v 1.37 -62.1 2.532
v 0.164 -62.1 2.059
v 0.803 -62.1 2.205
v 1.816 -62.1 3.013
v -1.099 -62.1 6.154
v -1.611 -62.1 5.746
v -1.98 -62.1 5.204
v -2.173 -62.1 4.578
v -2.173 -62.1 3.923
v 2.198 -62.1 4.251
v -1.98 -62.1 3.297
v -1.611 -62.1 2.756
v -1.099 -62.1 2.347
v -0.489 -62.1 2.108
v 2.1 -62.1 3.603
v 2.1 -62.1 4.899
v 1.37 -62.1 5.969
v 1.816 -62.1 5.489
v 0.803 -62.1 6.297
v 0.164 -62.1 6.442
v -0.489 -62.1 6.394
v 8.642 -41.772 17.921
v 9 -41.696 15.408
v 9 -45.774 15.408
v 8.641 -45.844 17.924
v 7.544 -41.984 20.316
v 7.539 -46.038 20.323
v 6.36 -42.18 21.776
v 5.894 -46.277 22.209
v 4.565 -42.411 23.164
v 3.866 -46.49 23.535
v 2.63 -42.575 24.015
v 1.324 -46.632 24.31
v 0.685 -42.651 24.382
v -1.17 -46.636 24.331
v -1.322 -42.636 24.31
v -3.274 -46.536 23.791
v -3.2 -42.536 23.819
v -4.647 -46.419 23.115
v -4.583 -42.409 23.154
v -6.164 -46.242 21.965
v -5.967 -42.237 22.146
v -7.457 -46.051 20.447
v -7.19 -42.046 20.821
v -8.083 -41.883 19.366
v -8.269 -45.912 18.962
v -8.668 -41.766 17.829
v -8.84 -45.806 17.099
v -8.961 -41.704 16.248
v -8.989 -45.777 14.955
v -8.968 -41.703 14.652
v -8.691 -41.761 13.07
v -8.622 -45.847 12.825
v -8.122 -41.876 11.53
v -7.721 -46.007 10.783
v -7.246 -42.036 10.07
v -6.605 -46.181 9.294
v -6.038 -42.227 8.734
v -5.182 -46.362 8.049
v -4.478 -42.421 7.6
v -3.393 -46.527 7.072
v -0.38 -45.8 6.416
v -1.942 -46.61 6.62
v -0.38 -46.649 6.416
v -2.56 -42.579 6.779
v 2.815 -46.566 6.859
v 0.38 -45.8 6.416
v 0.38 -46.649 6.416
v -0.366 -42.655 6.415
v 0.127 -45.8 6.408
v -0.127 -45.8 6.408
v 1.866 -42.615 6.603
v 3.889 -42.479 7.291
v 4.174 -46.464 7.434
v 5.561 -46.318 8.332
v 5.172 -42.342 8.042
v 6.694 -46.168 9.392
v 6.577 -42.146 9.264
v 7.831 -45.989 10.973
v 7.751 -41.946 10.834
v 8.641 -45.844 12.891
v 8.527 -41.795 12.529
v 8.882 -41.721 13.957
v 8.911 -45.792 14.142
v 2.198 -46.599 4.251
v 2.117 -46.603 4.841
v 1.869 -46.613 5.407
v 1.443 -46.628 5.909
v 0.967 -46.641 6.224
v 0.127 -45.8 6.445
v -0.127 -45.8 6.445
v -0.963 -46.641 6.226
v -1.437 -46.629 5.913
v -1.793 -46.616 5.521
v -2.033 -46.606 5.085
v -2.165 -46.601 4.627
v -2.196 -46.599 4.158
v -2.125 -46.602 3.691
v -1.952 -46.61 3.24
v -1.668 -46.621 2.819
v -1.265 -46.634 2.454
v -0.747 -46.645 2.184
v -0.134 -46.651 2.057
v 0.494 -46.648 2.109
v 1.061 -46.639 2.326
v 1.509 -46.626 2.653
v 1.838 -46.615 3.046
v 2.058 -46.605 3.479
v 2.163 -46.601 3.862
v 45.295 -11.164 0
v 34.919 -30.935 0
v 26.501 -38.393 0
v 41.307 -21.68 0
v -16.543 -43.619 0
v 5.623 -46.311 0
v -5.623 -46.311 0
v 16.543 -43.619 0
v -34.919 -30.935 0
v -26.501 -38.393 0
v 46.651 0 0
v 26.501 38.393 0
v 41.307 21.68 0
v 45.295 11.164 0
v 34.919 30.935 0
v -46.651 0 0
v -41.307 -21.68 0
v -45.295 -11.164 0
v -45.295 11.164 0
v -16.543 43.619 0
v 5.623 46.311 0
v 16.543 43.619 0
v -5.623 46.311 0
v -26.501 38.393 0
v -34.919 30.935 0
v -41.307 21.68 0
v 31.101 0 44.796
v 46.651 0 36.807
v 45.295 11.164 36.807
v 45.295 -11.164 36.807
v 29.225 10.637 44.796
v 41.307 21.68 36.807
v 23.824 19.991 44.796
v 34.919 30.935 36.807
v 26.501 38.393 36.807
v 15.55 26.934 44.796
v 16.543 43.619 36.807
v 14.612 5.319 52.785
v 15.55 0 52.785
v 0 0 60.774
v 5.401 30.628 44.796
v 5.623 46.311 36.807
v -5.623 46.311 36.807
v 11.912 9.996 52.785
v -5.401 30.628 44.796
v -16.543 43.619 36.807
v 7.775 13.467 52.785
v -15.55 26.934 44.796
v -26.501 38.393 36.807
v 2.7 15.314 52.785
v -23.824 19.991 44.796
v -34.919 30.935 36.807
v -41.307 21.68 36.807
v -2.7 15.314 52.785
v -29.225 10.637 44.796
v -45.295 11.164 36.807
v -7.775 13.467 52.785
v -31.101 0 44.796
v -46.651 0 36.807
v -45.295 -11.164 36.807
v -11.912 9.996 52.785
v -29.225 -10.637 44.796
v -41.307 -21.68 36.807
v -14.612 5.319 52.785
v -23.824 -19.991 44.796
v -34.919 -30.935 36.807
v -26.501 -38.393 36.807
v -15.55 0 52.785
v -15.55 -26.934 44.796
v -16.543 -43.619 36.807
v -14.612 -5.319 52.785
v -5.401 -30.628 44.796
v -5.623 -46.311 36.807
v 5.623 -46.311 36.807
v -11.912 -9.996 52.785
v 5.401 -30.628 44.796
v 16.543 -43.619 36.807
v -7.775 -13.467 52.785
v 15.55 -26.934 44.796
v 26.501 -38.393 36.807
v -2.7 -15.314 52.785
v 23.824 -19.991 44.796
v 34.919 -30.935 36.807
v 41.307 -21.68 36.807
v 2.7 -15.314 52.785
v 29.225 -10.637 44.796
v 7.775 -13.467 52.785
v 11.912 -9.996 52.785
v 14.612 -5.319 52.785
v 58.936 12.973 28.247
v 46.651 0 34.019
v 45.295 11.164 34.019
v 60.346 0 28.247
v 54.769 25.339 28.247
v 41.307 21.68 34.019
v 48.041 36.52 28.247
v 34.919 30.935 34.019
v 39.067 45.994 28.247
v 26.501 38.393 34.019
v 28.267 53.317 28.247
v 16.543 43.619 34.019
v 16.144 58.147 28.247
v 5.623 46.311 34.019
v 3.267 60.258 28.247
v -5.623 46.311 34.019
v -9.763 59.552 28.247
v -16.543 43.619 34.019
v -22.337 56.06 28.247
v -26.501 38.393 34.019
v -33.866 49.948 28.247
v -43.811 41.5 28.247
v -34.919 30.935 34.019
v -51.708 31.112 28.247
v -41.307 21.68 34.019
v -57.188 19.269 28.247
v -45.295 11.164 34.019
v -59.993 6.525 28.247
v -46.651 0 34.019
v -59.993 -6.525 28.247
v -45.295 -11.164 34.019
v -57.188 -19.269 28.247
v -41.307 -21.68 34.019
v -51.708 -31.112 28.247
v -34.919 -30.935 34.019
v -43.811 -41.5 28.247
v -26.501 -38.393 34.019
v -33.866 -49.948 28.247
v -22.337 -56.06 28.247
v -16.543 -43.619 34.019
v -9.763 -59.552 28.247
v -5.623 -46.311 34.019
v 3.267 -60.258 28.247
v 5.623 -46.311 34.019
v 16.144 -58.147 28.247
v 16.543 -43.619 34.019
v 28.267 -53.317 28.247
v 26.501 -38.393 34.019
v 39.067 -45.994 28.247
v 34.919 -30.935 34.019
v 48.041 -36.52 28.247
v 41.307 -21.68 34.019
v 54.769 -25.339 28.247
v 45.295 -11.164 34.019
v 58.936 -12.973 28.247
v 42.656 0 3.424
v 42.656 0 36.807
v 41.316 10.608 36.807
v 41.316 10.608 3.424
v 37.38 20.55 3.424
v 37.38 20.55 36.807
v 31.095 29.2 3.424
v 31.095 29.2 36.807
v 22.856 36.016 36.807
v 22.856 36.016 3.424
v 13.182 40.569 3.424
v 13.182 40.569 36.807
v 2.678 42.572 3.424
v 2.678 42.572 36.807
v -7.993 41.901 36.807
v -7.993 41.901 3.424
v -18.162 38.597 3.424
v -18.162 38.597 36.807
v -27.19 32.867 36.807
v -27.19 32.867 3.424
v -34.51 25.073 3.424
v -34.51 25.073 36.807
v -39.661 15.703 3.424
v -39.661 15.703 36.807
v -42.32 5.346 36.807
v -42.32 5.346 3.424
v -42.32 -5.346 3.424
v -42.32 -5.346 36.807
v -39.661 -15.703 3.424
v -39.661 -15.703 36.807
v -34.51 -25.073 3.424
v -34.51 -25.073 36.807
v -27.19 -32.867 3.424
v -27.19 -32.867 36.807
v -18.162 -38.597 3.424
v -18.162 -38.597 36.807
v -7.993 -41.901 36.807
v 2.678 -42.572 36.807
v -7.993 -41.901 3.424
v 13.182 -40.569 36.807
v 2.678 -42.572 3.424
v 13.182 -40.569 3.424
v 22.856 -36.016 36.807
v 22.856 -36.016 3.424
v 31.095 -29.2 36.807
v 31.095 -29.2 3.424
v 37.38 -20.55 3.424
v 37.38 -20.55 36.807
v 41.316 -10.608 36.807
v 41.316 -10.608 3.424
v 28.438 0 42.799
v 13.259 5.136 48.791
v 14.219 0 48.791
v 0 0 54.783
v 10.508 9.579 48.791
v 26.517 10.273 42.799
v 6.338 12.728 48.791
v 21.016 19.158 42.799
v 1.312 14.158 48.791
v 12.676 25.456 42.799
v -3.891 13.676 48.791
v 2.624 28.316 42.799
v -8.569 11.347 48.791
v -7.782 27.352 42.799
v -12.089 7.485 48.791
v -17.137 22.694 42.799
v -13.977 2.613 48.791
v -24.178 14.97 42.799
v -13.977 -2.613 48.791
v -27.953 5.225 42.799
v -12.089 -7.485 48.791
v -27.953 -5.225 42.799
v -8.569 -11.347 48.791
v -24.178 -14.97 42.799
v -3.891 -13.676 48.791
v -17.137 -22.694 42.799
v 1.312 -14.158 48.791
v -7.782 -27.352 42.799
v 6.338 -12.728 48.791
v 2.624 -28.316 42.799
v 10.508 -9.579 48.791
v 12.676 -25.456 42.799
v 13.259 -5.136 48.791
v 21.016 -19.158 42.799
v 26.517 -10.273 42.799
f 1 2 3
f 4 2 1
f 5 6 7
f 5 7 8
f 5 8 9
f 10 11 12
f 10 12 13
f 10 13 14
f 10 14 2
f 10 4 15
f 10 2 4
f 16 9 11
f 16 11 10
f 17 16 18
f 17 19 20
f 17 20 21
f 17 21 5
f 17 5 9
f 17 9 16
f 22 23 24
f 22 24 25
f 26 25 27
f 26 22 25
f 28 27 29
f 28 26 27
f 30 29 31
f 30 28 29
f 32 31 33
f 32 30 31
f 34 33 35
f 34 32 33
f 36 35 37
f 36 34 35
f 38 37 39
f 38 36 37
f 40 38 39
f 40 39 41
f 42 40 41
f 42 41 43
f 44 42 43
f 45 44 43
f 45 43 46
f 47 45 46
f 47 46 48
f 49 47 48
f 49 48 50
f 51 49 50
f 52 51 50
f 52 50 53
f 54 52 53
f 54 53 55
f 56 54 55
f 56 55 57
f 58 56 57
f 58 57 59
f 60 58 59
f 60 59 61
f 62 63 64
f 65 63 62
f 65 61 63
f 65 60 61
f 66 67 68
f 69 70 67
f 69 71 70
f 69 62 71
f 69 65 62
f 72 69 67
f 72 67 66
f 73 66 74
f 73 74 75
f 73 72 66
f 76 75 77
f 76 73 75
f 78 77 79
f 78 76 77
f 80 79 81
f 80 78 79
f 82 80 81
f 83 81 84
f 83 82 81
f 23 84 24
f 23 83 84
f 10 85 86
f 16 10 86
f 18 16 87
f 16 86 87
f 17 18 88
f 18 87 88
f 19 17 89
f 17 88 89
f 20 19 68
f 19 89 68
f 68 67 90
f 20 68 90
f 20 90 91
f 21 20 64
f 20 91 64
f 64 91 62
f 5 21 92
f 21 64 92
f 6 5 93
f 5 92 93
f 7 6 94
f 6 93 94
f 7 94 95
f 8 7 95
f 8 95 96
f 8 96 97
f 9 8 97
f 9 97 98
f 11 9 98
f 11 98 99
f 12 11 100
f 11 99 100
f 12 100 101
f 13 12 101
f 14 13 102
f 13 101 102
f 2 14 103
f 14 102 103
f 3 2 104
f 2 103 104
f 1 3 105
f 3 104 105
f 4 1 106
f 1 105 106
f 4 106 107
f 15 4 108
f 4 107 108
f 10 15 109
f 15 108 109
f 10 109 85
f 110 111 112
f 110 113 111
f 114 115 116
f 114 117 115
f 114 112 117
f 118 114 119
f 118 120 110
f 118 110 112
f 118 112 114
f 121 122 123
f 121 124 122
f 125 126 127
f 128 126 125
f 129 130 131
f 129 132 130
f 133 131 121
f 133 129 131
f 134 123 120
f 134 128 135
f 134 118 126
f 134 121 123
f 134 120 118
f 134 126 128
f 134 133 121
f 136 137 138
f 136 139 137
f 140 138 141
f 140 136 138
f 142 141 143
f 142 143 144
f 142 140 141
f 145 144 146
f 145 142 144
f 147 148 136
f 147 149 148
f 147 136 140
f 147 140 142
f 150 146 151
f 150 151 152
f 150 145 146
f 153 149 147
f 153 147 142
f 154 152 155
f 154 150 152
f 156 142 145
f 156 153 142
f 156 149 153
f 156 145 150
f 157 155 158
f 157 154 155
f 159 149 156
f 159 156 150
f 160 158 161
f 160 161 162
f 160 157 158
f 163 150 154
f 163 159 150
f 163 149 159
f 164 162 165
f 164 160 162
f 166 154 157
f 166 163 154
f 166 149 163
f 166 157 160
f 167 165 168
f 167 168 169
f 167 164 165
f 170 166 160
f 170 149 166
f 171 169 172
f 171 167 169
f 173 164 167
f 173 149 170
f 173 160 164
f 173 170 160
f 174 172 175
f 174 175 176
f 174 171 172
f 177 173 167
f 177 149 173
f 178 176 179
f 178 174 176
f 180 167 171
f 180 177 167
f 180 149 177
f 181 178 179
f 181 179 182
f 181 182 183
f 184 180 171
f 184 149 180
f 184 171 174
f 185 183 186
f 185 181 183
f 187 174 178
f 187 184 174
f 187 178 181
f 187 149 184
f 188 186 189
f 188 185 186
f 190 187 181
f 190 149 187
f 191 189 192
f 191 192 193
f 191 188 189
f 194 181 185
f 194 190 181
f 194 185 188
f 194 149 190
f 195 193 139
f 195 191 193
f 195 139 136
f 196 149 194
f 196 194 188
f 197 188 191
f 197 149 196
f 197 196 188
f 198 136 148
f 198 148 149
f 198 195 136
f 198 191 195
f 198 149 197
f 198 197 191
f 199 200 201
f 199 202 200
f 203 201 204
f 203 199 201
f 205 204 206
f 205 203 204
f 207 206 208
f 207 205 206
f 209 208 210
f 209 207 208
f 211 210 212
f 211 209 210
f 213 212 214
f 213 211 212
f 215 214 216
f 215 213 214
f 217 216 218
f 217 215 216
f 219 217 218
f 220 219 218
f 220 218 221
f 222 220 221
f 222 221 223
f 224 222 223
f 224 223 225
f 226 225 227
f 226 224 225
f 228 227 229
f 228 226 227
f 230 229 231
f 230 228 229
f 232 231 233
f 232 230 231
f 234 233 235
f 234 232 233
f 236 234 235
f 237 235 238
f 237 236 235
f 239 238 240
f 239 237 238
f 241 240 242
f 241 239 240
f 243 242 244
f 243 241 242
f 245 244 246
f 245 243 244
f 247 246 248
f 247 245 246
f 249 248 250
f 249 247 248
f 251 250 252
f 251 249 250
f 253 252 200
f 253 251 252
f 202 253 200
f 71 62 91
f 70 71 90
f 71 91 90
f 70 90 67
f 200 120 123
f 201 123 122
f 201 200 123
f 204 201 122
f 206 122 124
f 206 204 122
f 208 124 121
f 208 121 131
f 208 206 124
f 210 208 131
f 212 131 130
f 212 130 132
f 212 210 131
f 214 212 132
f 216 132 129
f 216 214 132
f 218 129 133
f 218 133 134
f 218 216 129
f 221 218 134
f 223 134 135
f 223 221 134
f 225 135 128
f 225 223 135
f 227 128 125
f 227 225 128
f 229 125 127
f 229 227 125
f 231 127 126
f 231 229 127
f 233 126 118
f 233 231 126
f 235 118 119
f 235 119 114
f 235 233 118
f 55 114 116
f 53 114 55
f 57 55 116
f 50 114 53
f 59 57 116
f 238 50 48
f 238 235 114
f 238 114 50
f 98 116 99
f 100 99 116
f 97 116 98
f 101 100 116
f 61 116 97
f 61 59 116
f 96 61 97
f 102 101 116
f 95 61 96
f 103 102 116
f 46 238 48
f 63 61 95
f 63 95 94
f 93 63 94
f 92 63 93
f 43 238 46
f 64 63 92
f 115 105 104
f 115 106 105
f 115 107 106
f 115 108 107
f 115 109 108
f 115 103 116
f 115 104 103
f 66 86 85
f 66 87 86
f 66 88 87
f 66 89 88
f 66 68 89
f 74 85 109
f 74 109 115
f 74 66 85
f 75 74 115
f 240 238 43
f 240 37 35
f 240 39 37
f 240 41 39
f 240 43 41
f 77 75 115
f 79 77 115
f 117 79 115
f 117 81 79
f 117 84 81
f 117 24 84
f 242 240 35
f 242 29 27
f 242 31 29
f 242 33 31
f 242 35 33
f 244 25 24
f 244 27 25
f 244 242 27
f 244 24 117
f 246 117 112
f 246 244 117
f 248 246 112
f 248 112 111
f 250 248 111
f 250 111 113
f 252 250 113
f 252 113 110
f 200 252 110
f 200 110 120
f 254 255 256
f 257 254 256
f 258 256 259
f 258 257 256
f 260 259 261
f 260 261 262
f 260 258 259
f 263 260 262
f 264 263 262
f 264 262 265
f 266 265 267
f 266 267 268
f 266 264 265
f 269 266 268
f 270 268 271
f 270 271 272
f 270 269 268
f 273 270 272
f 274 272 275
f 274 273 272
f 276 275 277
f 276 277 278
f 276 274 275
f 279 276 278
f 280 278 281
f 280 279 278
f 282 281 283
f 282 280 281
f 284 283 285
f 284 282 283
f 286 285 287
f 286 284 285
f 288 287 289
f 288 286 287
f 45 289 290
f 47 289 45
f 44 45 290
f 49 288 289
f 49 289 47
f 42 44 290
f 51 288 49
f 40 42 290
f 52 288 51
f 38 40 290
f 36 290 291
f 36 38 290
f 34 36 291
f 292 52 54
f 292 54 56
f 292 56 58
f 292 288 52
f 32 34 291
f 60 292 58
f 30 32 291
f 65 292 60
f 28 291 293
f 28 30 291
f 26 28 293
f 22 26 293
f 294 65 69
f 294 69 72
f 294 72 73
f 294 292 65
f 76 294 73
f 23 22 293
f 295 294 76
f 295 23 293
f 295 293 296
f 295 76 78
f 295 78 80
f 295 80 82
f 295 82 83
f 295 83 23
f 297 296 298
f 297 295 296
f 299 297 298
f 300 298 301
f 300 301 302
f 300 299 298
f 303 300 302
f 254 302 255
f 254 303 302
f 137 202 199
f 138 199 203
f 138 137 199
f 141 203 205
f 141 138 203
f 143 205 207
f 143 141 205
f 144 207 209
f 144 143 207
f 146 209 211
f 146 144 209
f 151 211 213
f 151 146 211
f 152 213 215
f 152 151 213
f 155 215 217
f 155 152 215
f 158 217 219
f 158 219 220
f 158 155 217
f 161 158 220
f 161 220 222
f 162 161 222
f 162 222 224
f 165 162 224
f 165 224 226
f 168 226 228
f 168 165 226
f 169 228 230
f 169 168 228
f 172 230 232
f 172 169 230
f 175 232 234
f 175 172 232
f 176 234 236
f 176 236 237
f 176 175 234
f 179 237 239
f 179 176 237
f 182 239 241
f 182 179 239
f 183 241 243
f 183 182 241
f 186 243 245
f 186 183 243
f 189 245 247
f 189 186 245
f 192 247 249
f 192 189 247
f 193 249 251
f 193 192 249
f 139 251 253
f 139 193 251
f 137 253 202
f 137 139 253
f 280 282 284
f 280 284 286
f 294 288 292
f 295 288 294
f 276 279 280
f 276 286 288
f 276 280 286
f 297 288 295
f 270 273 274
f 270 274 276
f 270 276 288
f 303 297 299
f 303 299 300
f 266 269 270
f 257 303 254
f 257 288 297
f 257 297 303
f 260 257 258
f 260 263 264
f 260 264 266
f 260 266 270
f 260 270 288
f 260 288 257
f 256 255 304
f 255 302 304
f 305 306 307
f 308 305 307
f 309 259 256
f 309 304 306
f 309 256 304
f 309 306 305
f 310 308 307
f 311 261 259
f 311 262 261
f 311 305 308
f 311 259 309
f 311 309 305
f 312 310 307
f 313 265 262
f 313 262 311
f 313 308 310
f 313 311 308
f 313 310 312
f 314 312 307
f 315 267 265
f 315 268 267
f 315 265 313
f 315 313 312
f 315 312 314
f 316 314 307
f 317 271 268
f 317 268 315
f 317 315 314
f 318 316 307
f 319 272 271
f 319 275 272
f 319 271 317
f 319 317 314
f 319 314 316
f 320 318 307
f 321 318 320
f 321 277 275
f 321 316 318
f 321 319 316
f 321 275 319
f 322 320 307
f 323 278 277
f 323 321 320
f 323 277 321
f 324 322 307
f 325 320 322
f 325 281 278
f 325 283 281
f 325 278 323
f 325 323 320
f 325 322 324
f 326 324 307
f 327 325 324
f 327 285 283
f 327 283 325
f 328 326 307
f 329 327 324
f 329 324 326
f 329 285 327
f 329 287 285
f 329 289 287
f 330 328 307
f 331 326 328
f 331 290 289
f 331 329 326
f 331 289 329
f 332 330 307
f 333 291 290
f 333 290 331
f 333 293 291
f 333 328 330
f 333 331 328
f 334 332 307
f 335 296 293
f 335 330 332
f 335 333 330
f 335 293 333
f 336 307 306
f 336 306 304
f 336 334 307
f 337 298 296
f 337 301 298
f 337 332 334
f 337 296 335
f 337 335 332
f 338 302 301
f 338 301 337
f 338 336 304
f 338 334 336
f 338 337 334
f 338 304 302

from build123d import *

# Parameters (mm, degrees)
F2_R     = 9.000031
F3_DEPTH = 67.8
F5_R     = 2.197813
F6_DEPTH = 16.3


with BuildPart() as f1:
    # F0 (on Front) → F1 (revolve)
    with BuildSketch(Plane.XZ):
        Polygon((0, 3.423913), (0, 0), (42.65625, 0), (46.650816, 0), (46.650816, 34.018698), (60.346473, 28.247284), (46.650816, 36.807068), (0, 60.774457), (0, 54.78261), (42.65625, 36.807068), (42.65625, 3.423913), align=None)
    revolve(axis=Axis((0, 0, 1.711957), (0, 0, 1)))

    # F2 (on Front) → F3 (cut)
    with BuildSketch(Plane.XZ):
        with Locations((0, 15.407609)):
            Circle(F2_R)
    extrude(amount=F3_DEPTH, mode=Mode.SUBTRACT)

    # F5 (on offset) → F6 (join)
    with BuildSketch(Plane.XZ.offset(45.8)):
        with Locations((0, 4.250792)):
            Circle(F5_R)
    extrude(amount=F6_DEPTH)


solid = f1.part
